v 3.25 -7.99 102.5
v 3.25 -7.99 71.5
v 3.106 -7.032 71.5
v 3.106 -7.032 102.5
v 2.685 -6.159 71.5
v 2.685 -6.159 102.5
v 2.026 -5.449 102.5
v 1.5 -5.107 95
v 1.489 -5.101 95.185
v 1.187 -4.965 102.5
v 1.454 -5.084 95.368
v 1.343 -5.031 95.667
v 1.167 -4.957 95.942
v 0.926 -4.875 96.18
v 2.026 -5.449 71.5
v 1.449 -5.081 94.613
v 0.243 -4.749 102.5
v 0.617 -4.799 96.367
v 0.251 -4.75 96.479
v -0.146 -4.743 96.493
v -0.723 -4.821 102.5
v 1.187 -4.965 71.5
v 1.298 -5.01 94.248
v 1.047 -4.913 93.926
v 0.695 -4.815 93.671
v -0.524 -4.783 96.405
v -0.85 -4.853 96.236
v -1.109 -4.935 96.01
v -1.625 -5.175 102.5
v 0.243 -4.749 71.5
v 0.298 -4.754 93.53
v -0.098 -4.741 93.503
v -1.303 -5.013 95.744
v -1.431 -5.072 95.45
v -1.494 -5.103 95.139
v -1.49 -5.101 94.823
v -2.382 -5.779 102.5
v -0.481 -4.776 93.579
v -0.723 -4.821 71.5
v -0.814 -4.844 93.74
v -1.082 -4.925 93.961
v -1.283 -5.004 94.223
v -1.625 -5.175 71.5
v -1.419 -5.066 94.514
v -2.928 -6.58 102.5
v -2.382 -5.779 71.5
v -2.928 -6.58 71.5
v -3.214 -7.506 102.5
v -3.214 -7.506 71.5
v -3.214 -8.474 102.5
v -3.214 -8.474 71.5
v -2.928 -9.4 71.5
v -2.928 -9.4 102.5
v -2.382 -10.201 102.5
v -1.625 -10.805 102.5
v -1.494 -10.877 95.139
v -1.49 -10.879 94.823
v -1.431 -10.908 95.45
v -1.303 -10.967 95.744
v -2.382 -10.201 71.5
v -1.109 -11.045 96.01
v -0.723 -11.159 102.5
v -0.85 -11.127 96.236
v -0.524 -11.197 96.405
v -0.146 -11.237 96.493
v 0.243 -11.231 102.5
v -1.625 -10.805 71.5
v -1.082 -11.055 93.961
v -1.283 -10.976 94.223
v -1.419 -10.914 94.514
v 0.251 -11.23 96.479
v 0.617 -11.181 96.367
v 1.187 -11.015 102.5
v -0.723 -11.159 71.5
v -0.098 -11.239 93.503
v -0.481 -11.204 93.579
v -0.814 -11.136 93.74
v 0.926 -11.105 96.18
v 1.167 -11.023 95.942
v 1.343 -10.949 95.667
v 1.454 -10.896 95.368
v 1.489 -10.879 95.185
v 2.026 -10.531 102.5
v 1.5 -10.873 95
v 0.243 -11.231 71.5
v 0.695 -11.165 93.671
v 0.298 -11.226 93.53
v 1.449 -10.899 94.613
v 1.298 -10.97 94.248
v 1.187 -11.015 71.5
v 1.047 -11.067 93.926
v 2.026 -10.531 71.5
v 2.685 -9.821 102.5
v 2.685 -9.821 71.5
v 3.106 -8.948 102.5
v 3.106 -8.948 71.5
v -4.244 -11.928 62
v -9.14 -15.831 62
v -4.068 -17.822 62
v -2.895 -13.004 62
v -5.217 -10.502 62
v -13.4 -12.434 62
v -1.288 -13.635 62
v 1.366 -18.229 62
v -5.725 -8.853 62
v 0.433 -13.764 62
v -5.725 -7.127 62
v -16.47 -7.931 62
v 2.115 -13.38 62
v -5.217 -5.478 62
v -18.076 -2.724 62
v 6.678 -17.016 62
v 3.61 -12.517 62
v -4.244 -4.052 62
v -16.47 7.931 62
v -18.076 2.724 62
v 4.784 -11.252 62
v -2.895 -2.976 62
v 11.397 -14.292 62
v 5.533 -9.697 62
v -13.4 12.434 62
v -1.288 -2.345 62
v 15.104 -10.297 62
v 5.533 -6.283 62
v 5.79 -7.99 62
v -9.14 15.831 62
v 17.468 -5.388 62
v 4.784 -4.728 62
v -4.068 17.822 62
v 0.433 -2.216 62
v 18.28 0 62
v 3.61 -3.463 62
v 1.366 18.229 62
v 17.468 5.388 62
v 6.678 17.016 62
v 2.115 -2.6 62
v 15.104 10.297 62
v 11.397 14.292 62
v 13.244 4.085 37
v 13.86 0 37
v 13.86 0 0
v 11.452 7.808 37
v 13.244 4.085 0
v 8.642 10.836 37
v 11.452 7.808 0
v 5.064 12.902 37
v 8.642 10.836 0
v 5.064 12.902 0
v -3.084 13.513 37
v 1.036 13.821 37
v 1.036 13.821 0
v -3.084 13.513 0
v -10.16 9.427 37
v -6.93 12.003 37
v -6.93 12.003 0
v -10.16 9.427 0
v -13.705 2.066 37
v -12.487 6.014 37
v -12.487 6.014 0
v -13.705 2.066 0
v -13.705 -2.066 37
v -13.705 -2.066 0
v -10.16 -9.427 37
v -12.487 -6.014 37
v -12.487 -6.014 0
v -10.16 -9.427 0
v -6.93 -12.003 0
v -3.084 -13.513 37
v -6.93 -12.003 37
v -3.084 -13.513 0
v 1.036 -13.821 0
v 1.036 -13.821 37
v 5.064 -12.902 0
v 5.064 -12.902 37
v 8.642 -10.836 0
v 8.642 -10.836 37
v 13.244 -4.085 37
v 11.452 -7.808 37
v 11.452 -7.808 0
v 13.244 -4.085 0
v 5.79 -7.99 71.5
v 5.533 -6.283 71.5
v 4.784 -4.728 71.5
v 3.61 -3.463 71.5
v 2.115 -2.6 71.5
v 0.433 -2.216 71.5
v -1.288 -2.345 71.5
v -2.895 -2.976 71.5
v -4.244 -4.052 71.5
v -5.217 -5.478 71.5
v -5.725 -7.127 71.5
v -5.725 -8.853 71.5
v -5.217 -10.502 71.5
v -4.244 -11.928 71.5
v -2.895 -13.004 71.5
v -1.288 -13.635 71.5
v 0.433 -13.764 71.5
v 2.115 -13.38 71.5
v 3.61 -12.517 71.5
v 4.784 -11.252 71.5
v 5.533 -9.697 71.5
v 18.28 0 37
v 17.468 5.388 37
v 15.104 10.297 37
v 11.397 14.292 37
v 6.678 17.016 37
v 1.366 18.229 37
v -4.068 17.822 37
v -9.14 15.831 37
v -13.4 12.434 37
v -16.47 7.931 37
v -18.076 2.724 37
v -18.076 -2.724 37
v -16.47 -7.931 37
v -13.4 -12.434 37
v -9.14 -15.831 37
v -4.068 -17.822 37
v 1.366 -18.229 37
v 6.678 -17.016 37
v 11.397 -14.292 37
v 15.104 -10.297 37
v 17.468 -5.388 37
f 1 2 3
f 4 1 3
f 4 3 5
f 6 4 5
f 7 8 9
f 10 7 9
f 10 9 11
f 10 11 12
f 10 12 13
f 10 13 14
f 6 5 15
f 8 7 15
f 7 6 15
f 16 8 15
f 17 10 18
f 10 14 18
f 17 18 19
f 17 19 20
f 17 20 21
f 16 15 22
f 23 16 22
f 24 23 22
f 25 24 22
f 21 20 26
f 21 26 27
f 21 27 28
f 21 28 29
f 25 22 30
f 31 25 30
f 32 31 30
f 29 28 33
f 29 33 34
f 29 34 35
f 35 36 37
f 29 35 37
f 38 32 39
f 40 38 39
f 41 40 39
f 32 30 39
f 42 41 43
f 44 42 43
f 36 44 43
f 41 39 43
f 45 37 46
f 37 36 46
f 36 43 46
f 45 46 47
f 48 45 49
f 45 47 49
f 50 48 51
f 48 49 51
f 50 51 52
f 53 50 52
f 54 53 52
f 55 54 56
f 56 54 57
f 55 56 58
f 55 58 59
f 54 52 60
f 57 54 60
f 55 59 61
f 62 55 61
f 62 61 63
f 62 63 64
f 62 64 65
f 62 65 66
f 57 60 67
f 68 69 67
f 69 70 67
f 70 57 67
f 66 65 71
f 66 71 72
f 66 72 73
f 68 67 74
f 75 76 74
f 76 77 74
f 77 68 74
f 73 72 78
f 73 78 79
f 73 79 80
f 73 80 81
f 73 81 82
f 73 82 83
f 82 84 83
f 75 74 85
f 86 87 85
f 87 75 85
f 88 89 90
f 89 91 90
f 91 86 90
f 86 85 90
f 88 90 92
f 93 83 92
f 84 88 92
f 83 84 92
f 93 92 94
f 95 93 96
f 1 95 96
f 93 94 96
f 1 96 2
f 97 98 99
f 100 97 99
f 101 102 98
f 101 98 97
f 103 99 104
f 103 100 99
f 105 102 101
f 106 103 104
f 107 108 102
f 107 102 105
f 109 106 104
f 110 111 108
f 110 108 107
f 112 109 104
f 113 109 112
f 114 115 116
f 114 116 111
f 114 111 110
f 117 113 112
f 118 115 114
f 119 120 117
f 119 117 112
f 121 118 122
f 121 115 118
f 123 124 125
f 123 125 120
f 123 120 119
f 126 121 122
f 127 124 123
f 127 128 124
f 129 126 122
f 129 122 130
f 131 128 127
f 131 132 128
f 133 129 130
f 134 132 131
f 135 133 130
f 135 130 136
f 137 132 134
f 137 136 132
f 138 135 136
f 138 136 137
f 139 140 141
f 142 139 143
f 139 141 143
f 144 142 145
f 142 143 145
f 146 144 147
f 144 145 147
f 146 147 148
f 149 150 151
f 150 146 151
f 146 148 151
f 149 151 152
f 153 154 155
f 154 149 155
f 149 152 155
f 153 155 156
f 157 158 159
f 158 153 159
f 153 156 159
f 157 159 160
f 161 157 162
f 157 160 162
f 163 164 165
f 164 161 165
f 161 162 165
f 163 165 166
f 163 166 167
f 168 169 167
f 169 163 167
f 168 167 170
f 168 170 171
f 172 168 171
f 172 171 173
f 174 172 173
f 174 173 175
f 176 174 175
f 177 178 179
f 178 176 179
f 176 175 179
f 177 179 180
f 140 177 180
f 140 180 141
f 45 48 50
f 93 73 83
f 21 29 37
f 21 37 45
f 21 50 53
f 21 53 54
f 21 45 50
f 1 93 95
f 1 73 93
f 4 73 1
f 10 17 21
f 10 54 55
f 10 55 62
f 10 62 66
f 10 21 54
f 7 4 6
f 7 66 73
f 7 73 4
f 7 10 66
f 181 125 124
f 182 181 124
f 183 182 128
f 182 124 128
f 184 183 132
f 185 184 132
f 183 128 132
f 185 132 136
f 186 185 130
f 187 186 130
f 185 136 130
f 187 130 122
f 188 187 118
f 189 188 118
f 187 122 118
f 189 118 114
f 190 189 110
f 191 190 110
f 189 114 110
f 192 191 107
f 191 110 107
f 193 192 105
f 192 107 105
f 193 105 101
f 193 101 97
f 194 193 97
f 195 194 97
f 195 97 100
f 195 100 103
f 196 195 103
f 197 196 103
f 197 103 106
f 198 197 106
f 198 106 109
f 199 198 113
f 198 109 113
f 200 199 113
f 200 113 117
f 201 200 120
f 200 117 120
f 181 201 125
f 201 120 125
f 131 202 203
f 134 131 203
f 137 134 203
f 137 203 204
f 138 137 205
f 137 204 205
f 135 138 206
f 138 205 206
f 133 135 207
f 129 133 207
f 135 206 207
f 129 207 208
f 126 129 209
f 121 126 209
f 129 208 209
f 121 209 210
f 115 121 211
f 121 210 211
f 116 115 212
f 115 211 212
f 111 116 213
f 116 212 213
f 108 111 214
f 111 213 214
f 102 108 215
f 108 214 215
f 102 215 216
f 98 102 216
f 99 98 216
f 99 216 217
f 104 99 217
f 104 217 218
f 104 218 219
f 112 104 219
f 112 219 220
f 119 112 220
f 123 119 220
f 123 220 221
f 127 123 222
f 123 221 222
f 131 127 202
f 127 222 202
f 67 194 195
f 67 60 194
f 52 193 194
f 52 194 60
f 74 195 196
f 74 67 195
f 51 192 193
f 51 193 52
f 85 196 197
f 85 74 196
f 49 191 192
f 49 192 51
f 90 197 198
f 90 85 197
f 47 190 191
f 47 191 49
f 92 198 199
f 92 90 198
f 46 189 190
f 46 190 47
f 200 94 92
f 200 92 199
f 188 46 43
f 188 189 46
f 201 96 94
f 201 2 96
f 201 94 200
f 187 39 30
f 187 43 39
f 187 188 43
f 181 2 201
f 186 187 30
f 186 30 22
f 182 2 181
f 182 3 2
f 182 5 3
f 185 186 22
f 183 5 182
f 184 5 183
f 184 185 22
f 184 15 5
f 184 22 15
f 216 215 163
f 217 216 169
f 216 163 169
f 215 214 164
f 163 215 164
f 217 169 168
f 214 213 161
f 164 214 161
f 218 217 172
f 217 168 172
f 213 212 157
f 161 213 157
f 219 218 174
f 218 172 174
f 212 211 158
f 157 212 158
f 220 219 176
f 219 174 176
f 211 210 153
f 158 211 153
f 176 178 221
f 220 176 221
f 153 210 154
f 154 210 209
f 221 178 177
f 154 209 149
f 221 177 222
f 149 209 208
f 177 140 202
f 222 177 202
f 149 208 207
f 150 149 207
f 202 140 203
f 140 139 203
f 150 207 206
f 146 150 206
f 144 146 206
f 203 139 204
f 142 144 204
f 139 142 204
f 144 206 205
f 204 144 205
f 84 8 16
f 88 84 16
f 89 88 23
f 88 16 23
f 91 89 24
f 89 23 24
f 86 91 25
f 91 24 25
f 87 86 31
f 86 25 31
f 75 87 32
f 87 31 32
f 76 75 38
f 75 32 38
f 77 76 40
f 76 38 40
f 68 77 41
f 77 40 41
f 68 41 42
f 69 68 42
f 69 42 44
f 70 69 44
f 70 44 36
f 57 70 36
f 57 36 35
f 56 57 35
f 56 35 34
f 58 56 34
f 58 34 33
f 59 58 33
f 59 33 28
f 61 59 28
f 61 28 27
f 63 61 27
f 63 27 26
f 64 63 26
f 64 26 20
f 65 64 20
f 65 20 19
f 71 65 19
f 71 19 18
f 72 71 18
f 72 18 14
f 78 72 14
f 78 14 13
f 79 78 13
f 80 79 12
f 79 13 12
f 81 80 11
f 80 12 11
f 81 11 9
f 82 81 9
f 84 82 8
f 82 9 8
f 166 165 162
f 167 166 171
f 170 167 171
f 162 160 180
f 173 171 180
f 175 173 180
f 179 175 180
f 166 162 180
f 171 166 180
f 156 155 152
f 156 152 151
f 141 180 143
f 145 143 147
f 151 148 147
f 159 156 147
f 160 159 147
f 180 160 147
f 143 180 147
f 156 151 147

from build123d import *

# Parameters (mm, degrees)
SKETCH6_R           = 13.86
BOSS_EXTRUDE4_DEPTH = 62
SKETCH7_R           = 18.28
BOSS_EXTRUDE5_DEPTH = 25
SKETCH8_R           = 5.79
BOSS_EXTRUDE6_DEPTH = 9.5
SKETCH9_R           = 3.25
BOSS_EXTRUDE7_DEPTH = 31
SKETCH13_R          = 1.5
CUT_EXTRUDE1_DEPTH  = 20


with BuildPart() as part:
    # Sketch6 → Boss-Extrude4 (new body)
    with BuildSketch(Plane.XY):
        Circle(SKETCH6_R)
    extrude(amount=BOSS_EXTRUDE4_DEPTH)

    # Sketch7 → Boss-Extrude5 (add)
    with BuildSketch(Plane.XY.offset(37)):
        Circle(SKETCH7_R)
    extrude(amount=BOSS_EXTRUDE5_DEPTH)

    # Sketch8 → Boss-Extrude6 (add)
    with BuildSketch(Plane.XY.offset(62)):
        with Locations((0, -7.99)):
            Circle(SKETCH8_R)
    extrude(amount=BOSS_EXTRUDE6_DEPTH)

    # Sketch9 → Boss-Extrude7 (add)
    with BuildSketch(Plane.XY.offset(71.5)):
        with Locations((0, -7.99)):
            Circle(SKETCH9_R)
    extrude(amount=BOSS_EXTRUDE7_DEPTH)

    # Sketch13 → Cut-Extrude1 (cut)
    with BuildSketch(Plane(origin=(0, 0, 0), x_dir=(1, 0, 0), z_dir=(0, 1, 0))):
        with Locations((0, -95)):
            Circle(SKETCH13_R)
    extrude(amount=-CUT_EXTRUDE1_DEPTH, mode=Mode.SUBTRACT)


solid = part.part
